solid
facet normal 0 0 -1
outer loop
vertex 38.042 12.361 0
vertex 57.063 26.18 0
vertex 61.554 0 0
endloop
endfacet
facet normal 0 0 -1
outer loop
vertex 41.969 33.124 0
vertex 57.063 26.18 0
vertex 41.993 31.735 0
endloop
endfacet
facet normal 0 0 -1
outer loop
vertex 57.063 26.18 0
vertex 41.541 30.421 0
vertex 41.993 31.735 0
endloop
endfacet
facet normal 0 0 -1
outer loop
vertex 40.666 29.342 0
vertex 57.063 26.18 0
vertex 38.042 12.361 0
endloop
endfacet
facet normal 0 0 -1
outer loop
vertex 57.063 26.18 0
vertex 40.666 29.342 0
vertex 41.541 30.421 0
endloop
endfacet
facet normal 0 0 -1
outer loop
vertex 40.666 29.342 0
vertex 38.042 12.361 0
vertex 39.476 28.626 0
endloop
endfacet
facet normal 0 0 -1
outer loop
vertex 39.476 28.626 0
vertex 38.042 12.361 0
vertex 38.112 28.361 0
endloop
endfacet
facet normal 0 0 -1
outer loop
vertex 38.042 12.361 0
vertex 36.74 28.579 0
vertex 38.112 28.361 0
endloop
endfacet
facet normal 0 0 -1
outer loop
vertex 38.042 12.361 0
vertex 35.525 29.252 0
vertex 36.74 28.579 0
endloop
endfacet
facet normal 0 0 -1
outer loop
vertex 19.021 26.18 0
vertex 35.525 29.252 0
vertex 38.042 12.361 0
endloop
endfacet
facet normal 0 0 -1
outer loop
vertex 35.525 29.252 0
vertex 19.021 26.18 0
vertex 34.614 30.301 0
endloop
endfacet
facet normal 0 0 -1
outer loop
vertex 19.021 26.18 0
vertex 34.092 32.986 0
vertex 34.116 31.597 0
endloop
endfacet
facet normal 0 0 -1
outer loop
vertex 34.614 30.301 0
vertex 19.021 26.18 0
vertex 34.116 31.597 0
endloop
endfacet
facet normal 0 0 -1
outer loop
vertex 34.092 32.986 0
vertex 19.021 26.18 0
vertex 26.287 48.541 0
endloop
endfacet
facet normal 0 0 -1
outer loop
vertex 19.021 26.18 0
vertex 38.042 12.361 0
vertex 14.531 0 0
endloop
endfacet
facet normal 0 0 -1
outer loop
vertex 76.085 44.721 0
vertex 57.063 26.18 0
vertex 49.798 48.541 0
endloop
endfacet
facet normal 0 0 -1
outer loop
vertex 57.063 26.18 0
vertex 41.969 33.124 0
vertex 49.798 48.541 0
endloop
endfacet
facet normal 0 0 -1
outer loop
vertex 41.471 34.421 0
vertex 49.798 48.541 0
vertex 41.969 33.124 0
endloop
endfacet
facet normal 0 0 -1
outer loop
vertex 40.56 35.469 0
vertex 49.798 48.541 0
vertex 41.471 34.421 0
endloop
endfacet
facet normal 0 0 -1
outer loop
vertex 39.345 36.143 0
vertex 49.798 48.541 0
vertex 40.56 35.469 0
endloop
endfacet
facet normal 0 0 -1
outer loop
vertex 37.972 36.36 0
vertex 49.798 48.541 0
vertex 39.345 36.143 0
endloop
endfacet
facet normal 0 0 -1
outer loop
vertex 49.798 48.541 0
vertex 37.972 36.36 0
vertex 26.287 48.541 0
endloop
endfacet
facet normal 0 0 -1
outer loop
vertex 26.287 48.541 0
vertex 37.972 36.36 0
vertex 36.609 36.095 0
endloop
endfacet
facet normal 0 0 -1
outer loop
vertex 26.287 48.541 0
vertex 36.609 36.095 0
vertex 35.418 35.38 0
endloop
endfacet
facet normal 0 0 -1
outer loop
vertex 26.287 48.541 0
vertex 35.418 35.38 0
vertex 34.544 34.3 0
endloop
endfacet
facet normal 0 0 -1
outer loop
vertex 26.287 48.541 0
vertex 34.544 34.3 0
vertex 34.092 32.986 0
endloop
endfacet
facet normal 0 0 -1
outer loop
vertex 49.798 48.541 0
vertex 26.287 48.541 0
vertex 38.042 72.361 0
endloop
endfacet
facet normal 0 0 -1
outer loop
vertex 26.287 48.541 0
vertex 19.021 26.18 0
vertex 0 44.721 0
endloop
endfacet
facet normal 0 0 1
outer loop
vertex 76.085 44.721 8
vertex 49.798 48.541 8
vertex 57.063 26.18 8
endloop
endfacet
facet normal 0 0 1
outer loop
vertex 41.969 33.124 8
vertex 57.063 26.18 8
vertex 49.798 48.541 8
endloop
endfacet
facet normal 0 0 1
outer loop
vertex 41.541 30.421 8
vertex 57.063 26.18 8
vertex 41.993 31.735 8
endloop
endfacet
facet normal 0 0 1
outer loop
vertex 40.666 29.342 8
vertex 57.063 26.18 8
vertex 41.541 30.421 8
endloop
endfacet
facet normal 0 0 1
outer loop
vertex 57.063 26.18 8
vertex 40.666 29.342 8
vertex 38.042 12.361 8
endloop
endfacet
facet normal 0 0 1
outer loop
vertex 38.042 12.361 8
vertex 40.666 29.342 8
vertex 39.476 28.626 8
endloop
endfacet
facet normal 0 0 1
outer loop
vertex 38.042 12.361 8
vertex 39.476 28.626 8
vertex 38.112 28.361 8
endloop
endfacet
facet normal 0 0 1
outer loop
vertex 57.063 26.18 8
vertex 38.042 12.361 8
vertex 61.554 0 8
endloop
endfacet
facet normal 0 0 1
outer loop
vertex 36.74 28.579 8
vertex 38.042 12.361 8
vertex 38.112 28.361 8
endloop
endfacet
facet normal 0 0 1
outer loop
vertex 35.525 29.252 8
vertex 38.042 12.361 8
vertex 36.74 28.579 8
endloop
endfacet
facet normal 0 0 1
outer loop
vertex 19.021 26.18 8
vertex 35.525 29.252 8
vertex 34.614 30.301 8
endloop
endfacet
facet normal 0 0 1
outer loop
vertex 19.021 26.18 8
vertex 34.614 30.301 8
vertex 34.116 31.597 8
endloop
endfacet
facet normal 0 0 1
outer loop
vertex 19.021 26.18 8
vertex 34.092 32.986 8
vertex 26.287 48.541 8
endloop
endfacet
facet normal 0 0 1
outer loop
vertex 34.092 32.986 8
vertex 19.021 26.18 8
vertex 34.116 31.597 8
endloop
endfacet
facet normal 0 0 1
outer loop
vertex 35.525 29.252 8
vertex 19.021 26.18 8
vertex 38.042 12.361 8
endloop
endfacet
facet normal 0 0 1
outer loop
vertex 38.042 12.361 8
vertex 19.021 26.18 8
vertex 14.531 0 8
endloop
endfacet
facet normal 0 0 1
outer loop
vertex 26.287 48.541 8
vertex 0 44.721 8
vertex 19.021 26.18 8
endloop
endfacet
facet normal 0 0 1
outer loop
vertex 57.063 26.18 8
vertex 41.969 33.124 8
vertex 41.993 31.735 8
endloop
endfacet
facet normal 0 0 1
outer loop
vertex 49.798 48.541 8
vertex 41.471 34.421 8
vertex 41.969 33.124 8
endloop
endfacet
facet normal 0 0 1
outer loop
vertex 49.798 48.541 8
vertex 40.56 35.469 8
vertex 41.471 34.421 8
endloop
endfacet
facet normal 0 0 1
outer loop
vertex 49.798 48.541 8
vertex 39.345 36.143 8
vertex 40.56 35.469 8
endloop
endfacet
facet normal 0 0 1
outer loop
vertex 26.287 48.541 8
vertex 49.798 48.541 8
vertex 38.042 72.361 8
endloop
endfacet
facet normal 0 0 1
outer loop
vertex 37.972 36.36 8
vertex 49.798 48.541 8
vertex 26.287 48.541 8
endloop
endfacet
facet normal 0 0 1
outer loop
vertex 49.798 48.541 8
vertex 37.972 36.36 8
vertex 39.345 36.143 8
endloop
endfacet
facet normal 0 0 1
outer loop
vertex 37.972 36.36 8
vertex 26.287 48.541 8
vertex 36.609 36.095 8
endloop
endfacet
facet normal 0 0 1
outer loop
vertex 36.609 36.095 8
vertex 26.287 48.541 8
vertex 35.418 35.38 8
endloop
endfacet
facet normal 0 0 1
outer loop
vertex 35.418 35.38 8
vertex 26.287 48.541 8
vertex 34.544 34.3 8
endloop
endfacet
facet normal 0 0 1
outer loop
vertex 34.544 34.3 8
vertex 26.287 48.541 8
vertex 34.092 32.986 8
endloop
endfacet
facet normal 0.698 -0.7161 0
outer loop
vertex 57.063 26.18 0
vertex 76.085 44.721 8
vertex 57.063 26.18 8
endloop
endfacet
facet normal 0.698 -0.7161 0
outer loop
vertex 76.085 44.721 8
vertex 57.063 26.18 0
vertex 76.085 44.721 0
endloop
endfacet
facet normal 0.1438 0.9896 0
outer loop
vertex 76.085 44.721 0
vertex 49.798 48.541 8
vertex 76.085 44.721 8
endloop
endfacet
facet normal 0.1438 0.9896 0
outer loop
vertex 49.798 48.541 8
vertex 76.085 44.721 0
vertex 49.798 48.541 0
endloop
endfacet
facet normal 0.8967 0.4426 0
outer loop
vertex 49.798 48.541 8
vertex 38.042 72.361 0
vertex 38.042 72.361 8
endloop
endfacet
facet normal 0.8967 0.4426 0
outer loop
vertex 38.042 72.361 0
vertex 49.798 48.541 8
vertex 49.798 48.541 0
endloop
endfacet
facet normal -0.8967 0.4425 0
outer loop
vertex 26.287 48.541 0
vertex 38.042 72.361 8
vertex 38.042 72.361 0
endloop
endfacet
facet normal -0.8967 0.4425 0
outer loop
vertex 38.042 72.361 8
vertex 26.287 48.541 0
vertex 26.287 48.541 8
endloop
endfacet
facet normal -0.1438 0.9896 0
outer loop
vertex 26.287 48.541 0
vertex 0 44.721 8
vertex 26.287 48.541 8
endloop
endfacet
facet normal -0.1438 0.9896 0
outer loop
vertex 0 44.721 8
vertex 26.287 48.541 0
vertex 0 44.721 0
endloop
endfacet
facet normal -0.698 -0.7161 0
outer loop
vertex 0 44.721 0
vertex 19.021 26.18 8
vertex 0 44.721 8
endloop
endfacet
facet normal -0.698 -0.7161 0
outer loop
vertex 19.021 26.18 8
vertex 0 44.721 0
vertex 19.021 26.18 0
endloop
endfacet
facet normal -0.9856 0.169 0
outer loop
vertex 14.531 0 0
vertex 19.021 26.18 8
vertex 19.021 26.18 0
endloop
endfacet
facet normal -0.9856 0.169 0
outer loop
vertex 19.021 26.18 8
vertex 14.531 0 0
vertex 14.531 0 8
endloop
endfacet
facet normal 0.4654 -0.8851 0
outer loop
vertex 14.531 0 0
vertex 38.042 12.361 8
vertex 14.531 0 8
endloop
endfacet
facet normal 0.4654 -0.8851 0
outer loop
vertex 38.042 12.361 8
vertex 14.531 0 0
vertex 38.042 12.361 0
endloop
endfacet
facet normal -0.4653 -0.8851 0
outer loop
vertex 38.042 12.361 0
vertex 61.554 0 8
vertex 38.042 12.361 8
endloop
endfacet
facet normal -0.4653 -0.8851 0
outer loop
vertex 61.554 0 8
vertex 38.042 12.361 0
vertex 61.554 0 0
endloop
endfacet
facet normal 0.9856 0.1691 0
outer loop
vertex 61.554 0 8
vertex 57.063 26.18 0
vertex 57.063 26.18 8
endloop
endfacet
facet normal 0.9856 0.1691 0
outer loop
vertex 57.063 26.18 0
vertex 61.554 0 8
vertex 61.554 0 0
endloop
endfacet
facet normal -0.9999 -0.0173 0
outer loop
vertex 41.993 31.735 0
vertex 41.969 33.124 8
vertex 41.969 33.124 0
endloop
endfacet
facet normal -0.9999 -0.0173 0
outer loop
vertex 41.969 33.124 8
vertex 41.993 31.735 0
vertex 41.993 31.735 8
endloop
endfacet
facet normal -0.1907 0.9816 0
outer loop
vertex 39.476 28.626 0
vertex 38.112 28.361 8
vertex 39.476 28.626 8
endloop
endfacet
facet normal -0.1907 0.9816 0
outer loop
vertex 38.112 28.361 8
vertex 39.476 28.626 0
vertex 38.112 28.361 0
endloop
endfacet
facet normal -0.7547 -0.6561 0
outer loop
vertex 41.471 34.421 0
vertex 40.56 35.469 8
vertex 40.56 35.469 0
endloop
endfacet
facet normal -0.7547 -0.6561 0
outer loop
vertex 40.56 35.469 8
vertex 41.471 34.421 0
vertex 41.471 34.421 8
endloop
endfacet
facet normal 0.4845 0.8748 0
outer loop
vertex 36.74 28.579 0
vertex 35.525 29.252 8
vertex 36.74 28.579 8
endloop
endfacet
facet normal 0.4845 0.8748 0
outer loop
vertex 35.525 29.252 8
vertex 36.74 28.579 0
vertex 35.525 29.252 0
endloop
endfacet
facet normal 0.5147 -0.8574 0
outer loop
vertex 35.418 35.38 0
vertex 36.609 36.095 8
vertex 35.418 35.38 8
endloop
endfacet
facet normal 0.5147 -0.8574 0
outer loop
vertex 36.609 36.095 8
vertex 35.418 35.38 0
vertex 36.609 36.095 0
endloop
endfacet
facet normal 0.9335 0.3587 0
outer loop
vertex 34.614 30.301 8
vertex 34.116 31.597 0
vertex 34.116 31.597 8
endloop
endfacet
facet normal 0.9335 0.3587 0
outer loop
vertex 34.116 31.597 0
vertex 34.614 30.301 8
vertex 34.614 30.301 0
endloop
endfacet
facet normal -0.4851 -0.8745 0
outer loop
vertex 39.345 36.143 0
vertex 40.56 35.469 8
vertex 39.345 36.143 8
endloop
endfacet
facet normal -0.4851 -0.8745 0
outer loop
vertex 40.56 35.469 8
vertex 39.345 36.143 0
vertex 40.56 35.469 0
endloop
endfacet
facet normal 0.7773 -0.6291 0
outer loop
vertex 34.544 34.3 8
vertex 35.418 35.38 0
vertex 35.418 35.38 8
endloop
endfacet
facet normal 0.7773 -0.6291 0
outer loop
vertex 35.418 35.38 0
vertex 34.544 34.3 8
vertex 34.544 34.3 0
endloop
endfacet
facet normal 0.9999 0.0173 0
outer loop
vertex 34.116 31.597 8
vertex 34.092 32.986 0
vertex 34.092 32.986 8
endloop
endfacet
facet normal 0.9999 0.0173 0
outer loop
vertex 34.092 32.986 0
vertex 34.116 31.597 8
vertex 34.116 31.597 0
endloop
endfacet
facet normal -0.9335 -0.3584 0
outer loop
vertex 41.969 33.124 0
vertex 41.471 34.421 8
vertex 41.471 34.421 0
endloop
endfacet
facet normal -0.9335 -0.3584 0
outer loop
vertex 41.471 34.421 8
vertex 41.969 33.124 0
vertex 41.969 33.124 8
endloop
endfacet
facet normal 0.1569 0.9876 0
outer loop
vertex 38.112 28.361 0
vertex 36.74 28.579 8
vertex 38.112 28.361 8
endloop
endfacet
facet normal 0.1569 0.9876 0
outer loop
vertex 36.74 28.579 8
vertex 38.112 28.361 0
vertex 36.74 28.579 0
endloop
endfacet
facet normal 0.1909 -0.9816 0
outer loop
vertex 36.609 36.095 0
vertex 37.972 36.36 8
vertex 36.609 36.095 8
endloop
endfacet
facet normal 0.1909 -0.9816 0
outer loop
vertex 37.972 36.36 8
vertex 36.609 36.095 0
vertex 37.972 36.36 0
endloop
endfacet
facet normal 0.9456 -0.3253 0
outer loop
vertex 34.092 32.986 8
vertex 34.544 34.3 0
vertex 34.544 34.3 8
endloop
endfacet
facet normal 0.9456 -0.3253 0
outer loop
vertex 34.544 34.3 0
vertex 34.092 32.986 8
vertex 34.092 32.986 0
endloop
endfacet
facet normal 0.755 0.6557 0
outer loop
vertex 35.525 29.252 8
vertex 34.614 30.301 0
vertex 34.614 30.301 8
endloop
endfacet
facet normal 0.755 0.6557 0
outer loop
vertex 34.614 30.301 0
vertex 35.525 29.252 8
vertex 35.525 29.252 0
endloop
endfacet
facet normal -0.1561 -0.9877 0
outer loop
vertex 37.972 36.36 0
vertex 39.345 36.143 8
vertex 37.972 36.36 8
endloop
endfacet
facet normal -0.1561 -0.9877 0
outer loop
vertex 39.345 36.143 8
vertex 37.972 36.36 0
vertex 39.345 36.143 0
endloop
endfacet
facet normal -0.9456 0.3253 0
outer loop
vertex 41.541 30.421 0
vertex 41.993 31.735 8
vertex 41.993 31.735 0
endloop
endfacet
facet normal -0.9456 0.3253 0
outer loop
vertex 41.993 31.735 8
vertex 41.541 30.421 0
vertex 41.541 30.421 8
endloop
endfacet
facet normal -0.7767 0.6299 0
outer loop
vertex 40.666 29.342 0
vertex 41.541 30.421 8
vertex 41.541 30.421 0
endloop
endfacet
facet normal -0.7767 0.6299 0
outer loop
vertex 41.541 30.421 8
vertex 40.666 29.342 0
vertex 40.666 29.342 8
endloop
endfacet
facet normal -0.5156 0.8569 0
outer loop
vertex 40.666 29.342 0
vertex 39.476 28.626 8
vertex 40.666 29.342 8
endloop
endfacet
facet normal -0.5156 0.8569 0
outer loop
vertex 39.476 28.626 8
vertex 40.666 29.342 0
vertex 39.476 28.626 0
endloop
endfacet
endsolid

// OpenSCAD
$fn = 32;

// ----------------------------------------------------------------------
// Star wheel: 5-point star, R40
// ----------------------------------------------------------------------

// --- parameters (mm) ---
n_points = 5;             // number of points / teeth
r_out = 40;               // tip radius
r_in = 20;                // root radius
bore_r = 4;               // centre bore radius
plate_t = 8;              // plate thickness, Z (extrusion height)
bore_d = 8;               // centre bore diameter

profile = [[38.042, 72.361], [26.287, 48.541], [0, 44.721], [19.021, 26.18], [14.531, 0], [38.042, 12.361], [61.554, 0], [57.063, 26.18], [76.085, 44.721], [49.798, 48.541]];  // primary outline, 10 points, counter clockwise
void_1 = [[41.969, 33.124], [41.471, 34.421], [40.56, 35.469], [39.345, 36.143], [37.972, 36.36], [36.609, 36.095], [35.418, 35.38], [34.544, 34.3], [34.092, 32.986], [34.116, 31.597], [34.614, 30.301], [35.525, 29.252], [36.74, 28.579], [38.112, 28.361], [39.476, 28.626], [40.666, 29.342], [41.541, 30.421], [41.993, 31.735]];  // centre bore, 18 points

// --- the one profile operation ---
difference() {
  linear_extrude(height = plate_t) polygon(points = profile);
  translate([0, 0, -1])
    linear_extrude(height = plate_t + 2) polygon(points = void_1);
}
